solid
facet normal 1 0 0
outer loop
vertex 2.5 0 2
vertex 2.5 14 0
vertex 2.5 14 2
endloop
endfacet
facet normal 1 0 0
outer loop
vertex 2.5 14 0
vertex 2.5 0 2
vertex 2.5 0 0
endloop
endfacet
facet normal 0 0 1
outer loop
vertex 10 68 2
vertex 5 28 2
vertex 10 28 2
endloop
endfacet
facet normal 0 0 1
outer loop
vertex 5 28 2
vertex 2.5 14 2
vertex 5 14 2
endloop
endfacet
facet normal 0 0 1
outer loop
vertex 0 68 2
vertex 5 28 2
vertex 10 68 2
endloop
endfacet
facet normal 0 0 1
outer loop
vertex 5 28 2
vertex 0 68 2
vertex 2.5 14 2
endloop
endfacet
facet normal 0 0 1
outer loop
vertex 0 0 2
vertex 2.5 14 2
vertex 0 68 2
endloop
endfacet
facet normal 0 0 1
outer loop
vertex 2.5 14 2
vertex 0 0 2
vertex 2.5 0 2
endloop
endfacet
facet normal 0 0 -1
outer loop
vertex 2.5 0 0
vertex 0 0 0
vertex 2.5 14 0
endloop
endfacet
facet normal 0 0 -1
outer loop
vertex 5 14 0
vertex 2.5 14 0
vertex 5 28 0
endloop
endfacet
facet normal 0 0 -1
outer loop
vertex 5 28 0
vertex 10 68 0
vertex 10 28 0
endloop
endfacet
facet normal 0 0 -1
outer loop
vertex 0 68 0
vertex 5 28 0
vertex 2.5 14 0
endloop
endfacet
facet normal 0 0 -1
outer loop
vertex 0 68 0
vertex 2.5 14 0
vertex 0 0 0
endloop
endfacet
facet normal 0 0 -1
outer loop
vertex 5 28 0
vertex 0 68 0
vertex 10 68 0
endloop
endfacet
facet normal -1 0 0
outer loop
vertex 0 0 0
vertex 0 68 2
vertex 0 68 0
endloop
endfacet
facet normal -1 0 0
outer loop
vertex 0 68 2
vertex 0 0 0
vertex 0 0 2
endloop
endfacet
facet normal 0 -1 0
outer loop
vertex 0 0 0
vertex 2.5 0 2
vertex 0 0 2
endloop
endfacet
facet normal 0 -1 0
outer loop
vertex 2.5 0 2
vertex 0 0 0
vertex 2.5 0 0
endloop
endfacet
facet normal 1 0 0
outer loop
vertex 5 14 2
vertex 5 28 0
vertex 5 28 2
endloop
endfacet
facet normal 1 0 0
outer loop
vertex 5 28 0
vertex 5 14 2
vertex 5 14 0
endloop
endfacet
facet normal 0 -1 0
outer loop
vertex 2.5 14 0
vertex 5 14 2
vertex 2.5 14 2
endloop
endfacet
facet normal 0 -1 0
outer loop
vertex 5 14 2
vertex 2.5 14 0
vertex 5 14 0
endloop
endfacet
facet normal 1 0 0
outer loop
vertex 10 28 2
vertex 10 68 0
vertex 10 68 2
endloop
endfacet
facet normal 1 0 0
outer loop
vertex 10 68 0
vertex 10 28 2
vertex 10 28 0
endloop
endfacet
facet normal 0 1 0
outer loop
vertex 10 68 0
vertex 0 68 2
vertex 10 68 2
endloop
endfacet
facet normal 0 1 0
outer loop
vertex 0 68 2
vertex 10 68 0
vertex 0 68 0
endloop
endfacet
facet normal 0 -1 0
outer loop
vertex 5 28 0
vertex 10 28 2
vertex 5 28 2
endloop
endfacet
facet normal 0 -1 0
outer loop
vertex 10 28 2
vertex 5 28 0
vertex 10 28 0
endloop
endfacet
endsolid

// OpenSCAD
// Fence shims 2.5 / 5 / 10 mm.
include <../cad/punch_rig_v3_005.scad>
PART = "shims";
